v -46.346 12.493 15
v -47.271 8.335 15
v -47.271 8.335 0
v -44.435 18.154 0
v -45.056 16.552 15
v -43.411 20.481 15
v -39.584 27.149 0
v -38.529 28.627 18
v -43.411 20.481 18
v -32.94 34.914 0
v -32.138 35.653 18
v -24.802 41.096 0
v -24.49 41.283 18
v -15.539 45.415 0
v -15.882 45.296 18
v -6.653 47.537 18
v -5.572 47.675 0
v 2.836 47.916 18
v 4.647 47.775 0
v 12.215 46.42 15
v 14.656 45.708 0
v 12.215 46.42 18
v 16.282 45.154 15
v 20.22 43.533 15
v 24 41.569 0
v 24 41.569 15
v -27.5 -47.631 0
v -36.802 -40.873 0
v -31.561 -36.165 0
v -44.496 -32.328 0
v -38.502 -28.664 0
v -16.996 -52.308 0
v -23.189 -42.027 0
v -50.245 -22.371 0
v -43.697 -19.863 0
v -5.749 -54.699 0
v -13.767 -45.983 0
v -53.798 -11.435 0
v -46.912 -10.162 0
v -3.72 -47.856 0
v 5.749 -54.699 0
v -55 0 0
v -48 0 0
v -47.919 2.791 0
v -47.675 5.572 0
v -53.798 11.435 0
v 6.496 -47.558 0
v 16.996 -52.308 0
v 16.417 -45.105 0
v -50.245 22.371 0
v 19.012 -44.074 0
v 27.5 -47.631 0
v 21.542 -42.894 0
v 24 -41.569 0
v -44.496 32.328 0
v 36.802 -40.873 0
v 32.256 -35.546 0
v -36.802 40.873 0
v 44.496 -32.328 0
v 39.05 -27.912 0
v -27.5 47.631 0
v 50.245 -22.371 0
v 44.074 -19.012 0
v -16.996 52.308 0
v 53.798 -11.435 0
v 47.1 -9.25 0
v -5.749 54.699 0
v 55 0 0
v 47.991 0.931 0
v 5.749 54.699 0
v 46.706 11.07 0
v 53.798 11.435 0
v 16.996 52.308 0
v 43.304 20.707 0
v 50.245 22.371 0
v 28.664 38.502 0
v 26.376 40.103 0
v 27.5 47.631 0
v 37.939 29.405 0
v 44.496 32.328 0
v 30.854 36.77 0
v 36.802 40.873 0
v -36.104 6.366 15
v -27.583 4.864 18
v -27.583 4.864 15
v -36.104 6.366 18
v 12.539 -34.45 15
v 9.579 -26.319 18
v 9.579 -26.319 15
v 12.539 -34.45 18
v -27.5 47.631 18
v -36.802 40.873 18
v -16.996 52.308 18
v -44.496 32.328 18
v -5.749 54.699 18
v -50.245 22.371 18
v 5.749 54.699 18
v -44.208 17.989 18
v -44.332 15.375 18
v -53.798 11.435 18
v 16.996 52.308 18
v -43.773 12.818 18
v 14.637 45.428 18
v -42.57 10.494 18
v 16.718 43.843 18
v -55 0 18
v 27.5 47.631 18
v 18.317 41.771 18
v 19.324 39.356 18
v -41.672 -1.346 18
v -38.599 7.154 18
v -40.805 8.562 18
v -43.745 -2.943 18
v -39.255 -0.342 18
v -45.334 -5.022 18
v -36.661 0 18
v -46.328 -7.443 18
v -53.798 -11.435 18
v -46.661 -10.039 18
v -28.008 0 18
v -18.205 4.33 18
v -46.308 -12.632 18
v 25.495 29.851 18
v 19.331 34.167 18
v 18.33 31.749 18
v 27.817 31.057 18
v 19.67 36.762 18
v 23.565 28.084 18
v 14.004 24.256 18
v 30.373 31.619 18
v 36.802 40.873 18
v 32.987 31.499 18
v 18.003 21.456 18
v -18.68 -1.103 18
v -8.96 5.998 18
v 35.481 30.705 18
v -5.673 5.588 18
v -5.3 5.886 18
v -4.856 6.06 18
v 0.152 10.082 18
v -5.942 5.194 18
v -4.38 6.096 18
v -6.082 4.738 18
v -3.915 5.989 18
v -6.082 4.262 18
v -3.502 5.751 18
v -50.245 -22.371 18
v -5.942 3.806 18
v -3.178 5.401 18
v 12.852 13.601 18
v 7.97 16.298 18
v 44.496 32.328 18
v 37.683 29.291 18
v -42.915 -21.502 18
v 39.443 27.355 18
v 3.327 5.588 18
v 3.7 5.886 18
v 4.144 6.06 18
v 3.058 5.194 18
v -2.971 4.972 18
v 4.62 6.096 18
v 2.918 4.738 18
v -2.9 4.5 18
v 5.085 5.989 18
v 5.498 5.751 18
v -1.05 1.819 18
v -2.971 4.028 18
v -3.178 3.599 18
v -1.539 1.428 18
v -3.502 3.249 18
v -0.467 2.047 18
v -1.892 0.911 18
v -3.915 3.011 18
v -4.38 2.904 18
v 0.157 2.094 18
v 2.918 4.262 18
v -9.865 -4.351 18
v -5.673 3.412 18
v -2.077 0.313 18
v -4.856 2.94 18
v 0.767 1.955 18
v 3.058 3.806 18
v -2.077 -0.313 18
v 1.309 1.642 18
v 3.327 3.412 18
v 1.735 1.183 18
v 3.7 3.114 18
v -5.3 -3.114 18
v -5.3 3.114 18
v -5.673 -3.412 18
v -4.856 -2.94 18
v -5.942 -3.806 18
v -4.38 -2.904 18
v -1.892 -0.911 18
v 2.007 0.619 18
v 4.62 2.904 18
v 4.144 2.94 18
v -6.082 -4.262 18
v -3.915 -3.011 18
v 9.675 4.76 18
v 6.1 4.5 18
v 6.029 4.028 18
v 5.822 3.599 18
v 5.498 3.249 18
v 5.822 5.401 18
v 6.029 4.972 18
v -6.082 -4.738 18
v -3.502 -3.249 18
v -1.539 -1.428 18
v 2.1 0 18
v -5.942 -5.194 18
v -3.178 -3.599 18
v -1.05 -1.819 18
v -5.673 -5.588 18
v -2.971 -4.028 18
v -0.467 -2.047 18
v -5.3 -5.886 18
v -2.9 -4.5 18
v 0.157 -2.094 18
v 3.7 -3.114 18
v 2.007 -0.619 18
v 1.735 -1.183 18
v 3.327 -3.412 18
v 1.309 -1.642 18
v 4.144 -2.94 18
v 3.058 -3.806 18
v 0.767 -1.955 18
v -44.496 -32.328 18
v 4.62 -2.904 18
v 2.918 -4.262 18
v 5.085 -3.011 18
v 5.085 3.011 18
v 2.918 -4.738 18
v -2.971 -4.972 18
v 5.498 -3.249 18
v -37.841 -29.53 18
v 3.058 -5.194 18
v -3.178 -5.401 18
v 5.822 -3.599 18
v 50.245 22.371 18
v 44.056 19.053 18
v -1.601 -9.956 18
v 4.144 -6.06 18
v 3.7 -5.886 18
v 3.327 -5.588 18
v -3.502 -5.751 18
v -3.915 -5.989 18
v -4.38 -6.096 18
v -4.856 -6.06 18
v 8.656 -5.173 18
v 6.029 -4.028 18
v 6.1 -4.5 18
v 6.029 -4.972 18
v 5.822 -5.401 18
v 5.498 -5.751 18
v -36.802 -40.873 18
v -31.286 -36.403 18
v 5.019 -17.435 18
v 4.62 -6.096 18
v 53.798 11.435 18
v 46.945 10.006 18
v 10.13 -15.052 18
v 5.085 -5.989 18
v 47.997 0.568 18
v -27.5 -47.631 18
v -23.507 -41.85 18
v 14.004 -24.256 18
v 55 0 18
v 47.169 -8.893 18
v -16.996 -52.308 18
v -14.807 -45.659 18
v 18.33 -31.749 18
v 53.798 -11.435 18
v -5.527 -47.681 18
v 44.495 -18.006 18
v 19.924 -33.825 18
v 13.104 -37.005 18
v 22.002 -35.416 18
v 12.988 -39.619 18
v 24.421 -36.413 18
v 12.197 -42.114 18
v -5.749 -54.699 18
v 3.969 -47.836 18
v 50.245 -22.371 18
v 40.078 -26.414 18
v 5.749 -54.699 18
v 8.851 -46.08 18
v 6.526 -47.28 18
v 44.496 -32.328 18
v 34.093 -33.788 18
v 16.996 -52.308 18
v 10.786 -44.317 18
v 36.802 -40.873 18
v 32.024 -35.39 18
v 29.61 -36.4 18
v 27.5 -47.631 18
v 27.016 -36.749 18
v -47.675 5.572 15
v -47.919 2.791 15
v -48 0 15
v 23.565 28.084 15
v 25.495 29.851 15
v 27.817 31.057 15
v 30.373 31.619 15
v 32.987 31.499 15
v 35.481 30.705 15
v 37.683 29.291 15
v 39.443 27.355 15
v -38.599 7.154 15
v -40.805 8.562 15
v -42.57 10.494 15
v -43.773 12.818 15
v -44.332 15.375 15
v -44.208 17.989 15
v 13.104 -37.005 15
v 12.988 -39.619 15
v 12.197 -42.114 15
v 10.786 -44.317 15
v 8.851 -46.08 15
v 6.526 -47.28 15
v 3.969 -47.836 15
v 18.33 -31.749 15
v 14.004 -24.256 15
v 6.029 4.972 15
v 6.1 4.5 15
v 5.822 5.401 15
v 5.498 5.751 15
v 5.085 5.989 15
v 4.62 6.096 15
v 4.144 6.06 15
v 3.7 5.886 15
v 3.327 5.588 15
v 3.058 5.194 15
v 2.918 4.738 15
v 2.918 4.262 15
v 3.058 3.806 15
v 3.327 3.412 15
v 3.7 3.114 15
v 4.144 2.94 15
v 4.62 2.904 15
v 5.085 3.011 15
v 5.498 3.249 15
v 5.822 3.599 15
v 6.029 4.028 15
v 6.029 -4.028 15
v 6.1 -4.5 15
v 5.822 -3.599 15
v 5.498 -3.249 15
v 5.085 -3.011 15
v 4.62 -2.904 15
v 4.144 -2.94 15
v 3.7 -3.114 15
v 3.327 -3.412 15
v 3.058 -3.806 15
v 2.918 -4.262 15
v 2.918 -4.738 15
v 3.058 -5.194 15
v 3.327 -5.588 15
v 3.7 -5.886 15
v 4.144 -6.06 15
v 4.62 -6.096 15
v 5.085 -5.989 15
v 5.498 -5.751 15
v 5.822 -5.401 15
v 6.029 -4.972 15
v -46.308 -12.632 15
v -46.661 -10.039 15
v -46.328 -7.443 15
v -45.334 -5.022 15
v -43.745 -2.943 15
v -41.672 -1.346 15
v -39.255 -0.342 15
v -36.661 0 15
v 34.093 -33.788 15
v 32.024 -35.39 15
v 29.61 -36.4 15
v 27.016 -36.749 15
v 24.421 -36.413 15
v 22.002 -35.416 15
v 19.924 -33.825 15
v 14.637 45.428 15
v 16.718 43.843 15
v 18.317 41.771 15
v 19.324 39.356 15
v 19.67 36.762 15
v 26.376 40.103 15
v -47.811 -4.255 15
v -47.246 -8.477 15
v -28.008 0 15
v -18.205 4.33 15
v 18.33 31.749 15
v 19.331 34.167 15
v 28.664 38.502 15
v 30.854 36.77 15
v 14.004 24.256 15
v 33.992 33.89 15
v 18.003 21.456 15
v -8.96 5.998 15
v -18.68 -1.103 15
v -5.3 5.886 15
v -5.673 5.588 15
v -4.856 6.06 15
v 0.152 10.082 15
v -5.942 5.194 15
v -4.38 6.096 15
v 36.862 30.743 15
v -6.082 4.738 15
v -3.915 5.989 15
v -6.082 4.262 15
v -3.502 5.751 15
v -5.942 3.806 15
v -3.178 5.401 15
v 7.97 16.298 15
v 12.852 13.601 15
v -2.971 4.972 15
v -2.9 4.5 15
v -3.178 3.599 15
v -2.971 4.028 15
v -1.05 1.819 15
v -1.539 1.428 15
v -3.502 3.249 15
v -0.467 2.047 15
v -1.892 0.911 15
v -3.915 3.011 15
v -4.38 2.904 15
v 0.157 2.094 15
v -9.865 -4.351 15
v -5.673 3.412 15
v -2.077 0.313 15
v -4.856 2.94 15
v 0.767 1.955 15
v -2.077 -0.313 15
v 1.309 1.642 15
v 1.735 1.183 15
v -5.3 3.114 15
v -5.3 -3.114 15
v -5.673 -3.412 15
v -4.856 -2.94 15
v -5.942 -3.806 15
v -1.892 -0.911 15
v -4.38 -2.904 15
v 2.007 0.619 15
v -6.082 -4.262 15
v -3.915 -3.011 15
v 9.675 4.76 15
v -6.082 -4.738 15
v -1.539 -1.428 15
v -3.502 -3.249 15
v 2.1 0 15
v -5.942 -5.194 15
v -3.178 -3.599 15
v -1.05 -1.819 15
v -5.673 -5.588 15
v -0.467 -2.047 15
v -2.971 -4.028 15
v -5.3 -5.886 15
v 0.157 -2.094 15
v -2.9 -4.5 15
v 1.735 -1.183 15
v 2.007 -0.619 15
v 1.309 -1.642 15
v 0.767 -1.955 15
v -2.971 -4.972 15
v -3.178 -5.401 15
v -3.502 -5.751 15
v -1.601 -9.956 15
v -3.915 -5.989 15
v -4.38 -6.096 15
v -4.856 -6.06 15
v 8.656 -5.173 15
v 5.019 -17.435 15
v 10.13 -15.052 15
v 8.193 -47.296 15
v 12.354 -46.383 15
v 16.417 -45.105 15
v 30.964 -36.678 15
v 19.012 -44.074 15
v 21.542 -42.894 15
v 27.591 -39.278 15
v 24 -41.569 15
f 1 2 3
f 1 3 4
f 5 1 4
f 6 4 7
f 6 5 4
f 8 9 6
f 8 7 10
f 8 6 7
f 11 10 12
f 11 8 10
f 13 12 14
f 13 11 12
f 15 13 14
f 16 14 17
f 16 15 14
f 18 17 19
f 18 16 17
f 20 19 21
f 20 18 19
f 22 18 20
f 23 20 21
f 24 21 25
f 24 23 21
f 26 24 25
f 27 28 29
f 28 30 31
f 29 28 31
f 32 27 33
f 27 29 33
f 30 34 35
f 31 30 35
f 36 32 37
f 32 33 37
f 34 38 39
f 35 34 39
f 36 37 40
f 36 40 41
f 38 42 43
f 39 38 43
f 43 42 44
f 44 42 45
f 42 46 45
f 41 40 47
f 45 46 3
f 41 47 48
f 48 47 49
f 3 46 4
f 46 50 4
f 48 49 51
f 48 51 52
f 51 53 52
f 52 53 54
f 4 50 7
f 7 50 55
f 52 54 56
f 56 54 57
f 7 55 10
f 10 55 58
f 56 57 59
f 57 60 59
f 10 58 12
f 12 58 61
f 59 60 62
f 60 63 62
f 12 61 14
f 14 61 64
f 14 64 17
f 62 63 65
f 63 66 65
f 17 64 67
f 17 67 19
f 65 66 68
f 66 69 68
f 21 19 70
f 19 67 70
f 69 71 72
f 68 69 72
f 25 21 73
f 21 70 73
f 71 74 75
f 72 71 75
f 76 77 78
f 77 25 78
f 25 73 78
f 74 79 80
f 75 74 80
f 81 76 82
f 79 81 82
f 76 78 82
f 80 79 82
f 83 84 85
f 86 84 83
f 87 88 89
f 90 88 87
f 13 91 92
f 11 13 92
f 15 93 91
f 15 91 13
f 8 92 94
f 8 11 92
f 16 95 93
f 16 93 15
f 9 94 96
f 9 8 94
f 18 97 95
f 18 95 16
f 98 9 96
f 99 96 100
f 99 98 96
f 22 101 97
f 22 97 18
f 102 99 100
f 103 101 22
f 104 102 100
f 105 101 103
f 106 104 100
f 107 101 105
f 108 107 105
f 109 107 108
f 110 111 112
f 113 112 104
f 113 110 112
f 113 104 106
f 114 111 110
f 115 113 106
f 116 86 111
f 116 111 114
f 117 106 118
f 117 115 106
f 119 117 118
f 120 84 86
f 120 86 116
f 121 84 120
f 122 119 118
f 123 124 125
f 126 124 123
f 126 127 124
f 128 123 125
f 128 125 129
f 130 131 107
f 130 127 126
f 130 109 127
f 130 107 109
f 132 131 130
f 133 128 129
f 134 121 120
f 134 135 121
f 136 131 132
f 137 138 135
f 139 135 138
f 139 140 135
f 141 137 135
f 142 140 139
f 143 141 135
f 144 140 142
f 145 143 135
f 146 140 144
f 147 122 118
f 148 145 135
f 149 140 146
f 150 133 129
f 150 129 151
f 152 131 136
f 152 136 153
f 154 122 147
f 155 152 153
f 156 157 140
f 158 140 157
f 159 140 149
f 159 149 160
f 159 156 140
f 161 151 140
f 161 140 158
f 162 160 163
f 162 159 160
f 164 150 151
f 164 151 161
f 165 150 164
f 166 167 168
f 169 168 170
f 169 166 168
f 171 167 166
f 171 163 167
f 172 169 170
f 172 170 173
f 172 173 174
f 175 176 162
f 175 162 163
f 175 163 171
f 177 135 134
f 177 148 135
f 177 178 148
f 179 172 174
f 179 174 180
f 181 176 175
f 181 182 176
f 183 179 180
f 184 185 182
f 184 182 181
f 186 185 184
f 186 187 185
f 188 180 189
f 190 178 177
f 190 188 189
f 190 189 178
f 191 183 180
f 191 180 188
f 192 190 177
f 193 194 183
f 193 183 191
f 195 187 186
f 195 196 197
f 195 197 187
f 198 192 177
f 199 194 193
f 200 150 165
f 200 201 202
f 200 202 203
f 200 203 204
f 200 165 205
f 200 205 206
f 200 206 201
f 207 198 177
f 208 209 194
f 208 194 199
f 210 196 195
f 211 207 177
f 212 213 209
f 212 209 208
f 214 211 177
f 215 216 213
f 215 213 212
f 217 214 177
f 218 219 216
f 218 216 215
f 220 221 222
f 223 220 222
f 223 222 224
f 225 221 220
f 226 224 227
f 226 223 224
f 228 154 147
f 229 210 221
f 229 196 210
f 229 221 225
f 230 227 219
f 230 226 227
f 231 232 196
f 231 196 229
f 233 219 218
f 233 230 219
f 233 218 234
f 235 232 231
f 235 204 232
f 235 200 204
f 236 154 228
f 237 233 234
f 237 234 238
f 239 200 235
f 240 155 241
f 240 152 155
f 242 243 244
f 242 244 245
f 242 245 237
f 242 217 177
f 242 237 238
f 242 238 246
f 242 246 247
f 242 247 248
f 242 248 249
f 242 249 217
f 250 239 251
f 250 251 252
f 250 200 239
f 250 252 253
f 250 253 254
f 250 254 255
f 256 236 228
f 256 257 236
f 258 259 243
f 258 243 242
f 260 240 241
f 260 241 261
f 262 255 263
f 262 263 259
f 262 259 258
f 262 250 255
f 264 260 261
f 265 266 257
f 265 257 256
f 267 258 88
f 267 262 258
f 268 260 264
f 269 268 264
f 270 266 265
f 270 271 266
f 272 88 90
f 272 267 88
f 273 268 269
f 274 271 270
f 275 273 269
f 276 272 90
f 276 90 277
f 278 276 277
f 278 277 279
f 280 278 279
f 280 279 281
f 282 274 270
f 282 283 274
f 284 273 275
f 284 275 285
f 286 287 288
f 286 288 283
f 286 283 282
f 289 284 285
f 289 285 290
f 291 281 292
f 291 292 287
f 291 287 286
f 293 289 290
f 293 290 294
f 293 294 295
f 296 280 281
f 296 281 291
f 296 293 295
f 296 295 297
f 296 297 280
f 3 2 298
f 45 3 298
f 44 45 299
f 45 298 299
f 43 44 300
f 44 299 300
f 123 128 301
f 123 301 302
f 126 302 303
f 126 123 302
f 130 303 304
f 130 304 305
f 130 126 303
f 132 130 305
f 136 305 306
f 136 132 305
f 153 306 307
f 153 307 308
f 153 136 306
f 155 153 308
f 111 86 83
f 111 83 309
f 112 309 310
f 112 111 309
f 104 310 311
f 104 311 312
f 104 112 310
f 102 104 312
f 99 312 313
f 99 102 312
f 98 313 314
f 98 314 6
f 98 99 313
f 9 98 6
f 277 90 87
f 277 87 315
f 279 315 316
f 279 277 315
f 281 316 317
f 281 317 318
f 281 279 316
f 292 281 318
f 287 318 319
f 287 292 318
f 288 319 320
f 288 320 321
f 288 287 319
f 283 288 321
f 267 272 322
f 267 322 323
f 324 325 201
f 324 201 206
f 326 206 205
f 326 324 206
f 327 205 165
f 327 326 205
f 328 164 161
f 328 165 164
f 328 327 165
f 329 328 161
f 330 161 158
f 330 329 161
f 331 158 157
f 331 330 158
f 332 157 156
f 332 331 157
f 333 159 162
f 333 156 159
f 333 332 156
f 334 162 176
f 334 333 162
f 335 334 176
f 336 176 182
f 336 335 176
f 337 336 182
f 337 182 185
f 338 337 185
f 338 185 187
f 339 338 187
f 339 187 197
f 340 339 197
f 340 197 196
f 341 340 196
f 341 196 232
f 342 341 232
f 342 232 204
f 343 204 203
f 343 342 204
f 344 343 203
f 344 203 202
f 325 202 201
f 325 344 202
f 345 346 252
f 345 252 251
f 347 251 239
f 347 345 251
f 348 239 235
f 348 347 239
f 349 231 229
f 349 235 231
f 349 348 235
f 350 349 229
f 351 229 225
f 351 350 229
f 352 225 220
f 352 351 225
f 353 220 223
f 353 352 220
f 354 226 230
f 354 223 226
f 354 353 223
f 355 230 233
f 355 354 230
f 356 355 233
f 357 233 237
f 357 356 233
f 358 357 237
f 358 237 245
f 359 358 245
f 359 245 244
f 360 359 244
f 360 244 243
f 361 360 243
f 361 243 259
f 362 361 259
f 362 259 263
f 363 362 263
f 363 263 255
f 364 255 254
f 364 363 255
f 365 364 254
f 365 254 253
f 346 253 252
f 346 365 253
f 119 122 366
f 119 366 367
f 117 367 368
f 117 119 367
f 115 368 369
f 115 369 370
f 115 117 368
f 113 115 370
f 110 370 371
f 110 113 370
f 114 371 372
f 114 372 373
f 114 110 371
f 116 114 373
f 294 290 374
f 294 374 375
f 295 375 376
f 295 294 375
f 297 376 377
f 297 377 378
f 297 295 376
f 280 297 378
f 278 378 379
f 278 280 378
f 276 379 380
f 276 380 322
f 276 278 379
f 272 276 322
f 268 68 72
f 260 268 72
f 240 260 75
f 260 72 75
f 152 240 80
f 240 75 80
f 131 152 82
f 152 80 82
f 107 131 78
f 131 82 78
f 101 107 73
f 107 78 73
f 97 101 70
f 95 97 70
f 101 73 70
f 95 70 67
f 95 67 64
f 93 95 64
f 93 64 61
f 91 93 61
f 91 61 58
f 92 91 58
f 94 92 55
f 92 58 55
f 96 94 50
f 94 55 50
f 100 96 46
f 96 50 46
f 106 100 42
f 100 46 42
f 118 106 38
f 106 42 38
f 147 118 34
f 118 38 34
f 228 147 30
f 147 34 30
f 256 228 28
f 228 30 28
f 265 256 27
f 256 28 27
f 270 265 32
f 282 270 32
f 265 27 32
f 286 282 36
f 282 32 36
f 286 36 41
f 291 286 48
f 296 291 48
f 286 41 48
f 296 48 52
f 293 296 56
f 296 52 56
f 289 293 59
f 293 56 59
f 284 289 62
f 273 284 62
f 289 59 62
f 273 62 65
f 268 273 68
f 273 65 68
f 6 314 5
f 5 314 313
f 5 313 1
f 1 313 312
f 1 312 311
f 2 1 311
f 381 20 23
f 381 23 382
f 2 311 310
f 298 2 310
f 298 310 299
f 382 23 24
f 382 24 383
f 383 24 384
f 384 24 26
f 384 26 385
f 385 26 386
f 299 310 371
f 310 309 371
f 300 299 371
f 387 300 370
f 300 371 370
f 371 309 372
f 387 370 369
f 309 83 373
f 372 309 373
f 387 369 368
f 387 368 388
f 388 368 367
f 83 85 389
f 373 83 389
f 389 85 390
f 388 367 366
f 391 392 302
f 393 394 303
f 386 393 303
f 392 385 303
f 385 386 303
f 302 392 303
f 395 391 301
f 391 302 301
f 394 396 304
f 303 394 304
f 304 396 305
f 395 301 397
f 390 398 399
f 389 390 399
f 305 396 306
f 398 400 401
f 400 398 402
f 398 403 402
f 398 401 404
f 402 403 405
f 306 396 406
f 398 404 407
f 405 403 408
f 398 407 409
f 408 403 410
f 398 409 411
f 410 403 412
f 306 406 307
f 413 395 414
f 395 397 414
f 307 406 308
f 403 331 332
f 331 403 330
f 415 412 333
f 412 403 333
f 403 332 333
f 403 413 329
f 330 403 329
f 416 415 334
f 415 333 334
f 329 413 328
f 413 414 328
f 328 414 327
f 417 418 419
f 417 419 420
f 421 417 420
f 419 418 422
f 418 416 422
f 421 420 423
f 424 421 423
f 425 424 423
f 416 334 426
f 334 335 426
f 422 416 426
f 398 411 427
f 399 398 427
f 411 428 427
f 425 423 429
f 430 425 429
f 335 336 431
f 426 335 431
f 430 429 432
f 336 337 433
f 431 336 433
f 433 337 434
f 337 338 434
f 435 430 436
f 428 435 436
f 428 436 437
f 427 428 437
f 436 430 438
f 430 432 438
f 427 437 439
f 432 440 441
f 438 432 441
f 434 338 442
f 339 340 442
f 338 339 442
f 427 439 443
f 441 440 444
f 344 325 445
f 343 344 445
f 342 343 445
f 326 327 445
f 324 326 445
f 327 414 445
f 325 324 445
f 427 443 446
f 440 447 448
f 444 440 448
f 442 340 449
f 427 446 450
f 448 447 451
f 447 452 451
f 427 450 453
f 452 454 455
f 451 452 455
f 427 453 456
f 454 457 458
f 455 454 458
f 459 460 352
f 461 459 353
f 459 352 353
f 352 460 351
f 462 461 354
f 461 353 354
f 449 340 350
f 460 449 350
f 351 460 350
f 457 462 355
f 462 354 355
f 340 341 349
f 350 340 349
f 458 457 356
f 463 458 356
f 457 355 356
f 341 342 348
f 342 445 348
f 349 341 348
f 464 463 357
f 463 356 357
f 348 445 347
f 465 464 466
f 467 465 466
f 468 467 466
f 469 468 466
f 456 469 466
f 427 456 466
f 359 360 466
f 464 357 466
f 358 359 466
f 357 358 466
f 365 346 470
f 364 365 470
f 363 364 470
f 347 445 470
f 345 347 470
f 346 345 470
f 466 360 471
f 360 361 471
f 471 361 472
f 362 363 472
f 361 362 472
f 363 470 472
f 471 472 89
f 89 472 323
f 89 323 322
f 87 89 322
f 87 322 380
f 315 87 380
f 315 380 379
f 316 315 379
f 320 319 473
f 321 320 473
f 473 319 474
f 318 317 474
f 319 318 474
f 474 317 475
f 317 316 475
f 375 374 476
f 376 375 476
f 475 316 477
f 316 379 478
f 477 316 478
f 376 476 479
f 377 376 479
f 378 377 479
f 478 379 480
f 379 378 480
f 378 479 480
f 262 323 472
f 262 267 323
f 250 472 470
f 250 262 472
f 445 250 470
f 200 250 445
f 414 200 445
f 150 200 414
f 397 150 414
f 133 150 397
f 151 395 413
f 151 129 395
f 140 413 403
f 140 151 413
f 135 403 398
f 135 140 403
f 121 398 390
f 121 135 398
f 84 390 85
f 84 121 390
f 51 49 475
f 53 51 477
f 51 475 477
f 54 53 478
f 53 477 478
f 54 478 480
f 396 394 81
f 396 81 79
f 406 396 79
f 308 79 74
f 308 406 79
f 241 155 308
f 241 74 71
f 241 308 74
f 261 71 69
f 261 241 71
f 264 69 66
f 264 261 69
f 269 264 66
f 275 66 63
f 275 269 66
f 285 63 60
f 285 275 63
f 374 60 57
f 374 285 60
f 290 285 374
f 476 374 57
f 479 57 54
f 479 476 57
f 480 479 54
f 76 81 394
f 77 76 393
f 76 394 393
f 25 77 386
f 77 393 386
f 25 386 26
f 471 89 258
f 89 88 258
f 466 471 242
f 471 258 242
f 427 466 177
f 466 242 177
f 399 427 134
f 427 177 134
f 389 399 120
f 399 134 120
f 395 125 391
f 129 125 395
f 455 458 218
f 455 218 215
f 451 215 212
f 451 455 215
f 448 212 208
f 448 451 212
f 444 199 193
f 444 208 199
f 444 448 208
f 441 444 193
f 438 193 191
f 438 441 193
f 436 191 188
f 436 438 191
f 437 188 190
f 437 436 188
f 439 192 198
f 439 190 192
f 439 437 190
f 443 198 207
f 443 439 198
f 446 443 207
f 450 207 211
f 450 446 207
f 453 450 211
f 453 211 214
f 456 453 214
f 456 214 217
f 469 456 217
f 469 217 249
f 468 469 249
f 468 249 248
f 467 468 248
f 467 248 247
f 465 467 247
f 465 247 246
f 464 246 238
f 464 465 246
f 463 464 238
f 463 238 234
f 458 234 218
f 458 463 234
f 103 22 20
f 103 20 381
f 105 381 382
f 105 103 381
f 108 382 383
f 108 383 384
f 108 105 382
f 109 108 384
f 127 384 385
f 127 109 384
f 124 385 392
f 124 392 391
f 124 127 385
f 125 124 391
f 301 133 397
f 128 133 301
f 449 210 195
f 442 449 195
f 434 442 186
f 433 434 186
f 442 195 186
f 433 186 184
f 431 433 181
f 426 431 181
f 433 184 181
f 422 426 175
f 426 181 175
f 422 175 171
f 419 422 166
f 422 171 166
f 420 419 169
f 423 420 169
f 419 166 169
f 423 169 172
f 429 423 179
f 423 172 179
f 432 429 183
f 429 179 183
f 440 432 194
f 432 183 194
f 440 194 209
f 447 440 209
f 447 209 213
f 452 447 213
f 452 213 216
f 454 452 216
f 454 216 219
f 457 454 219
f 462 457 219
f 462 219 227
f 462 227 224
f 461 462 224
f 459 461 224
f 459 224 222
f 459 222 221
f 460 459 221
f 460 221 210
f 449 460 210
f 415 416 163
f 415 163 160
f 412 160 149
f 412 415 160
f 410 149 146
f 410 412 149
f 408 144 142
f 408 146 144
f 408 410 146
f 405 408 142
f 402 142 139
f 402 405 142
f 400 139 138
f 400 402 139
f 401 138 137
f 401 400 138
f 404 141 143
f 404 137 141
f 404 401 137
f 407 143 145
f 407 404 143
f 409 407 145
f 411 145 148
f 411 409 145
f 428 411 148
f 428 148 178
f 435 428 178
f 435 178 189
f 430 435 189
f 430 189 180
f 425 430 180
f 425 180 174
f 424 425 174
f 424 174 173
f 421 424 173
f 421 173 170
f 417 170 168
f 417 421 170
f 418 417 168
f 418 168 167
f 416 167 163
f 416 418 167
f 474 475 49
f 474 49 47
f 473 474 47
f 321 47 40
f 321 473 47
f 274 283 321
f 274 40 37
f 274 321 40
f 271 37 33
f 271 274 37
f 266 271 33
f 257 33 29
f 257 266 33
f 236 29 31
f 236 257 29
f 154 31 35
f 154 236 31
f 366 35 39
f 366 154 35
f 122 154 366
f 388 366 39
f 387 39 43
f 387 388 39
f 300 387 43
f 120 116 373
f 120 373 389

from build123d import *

# Parameters (mm, degrees)
ESQUISSE1_R             = 55
BOSS_EXTRU_1_DEPTH      = 18
ESQUISSE2_R             = 2.1
ENL_V_MAT_EXTRU_1_DEPTH = 80.837334625
ENL_V_MAT_EXTRU_2_DEPTH = 80.837334625
ENL_V_MAT_EXTRU_3_DEPTH = 80.837334625
ENL_V_START             = 15
ESQUISSE8_R             = 48
ENL_V_MAT_EXTRU_4_DEPTH = 15
CONG_3_R                = 10
CONG_4_R                = 10
CONG_5_R                = 60
CONG_7_R                = 40
ESQUISSE10_R            = 1.6
ENL_V_MAT_EXTRU_9_DEPTH = 80.837334785


with BuildPart() as part:
    # Esquisse1 → Boss.-Extru.1 (new body)
    with BuildSketch(Plane.XY):
        Circle(ESQUISSE1_R)
    extrude(amount=BOSS_EXTRU_1_DEPTH)

    # Esquisse2 → Enlèv. mat.-Extru.1 (cut, through all)
    with BuildSketch(Plane.XY.offset(18)):
        Circle(ESQUISSE2_R)
    extrude(amount=-ENL_V_MAT_EXTRU_1_DEPTH, mode=Mode.SUBTRACT)

    # Esquisse3 → Enlèv. mat.-Extru.2 (cut, through all)
    with BuildSketch(Plane.XY.offset(18)):
        with BuildLine():
            ThreePointArc((-7.5, 0), (-4.301823273, -6.143640332), (2.565151075, -7.047694656))
            Line((2.565151075, -7.047694656), (16.41696688, -45.105245798))
            ThreePointArc((16.41696688, -45.105245798), (-27.531668945, -39.319298126), (-48, 0))
            Line((-48, 0), (-7.5, 0))
        make_face()
        with BuildLine():
            ThreePointArc((-47.270772145, 8.335112528), (-20.285676564, 43.502773778), (24, 41.569219382))
            Line((24, 41.569219382), (3.75, 6.495190528))
            ThreePointArc((3.75, 6.495190528), (-3.169636963, 6.797308403), (-7.386058148, 1.302361333))
            Line((-7.386058148, 1.302361333), (-47.270772145, 8.335112528))
        make_face()
        with BuildLine():
            ThreePointArc((30.853805265, 36.77013327), (47.817345508, -4.183475652), (24, -41.569219382))
            Line((24, -41.569219382), (3.75, -6.495190528))
            ThreePointArc((3.75, -6.495190528), (7.471460236, -0.653668071), (4.820907073, 5.745333323))
            Line((4.820907073, 5.745333323), (30.853805265, 36.77013327))
        make_face()
    extrude(amount=-ENL_V_MAT_EXTRU_2_DEPTH, mode=Mode.SUBTRACT)

    # Esquisse7 → Enlèv. mat.-Extru.3 (cut, through all)
    with BuildSketch(Plane.XY):
        with BuildLine():
            Line((2.565151075, -7.047694656), (-27.531668945, -39.319298126))
            Line((-27.531668945, -39.319298126), (-7.5, 0))
            ThreePointArc((-7.5, 0), (-3.331557771, -4.75795759), (2.565151075, -7.047694656))
        make_face()
        with BuildLine():
            Line((4.820907073, 5.745333323), (47.817345508, -4.183475652))
            Line((47.817345508, -4.183475652), (3.75, -6.495190528))
            ThreePointArc((3.75, -6.495190528), (5.786291029, -0.506234869), (4.820907073, 5.745333323))
        make_face()
        with BuildLine():
            Line((3.75, 6.495190528), (-20.285676564, 43.502773778))
            Line((-20.285676564, 43.502773778), (-7.386058148, 1.302361333))
            ThreePointArc((-7.386058148, 1.302361333), (-2.454733258, 5.264192459), (3.75, 6.495190528))
        make_face()
    extrude(amount=ENL_V_MAT_EXTRU_3_DEPTH, mode=Mode.SUBTRACT)

    # Esquisse8 → Enlèv. mat.-Extru.4 (cut)
    with BuildSketch(Plane.XY.offset(ENL_V_START)):
        Circle(ESQUISSE8_R)
    extrude(amount=-ENL_V_MAT_EXTRU_4_DEPTH, mode=Mode.SUBTRACT)

    # Congé3
    # the kernel refuses this fillet: 10 mm, written as the material it adds along each edge
    with BuildSketch(Plane(origin=(-47.270772145, 8.335112528, 18), x_dir=(0.3028483404391726, 0.9530387624295452, 0), z_dir=(0, 0, -1))) as cong_3_piece_1:
        with BuildLine():
            CenterArc((11.416839641, 9.911490246), CONG_3_R, 172.371238355, 105.25752329)
            Line((1.505349395, 11.239029739), (0, 0))
            ThreePointArc((0, 0), (6.372189567, -0.42484682), (12.744379134, 0))
        make_face()
    extrude(amount=3)
    with BuildSketch(Plane(origin=(24, 41.569219382, 18), x_dir=(-0.9247372088845717, 0.38060621973947306, 0), z_dir=(0, 0, -1)), Plane(origin=(24, -41.569219382, 18), x_dir=(0.7919832595750325, 0.6105428048490187, 0), z_dir=(0, 0, -1)), Plane(origin=(-48, 0, 18), x_dir=(0.13275394930954024, -0.9911490245884924, 0), z_dir=(0, 0, -1))) as cong_3_piece_2:
        with BuildLine():
            CenterArc((11.416839641, -9.911490246), CONG_3_R, 82.371238355, 105.25752329)
            Line((1.505349395, -11.239029739), (0, 0))
            ThreePointArc((0, 0), (6.372189567, 0.42484682), (12.744379134, 0))
        make_face()
    extrude(amount=3)
    with BuildSketch(Plane(origin=(16.41696688, -45.105245798, 18), x_dir=(-0.34202014332566844, 0.9396926207859085, 0), z_dir=(0, 0, -1))) as cong_3_piece_3:
        with BuildLine():
            CenterArc((11.33939444, -10), CONG_3_R, 90, 105.25752329)
            ThreePointArc((1.691866661, -12.631578947), (0.42484682, -6.372189567), (0, 0))
            Line((0, 0), (11.33939444, 0))
        make_face()
    extrude(amount=3)

    # Congé4
    # the kernel refuses this fillet: 10 mm, written as the material it adds along each edge
    with BuildSketch(Plane(origin=(30.853805265, 36.77013327, 18), x_dir=(0.6739316088356829, -0.7387937375290534, 0), z_dir=(0, 0, -1))) as cong_4_piece_1:
        with BuildLine():
            CenterArc((11.416839641, 9.911490246), CONG_4_R, 172.371238355, 105.25752329)
            Line((1.505349395, 11.239029739), (0, 0))
            ThreePointArc((0, 0), (6.372189567, -0.42484682), (12.744379134, 0))
        make_face()
    extrude(amount=3)

    # Congé5
    # the kernel refuses this fillet: 60 mm, written as the material it adds along each edge
    with BuildSketch(Plane(origin=(-7.386058148, 1.302361333, 18), x_dir=(0.8285733508252506, 0.5598805250249523, 0), z_dir=(0, 0, -1)), Plane(origin=(2.565151075, -7.047694656, 18), x_dir=(-0.8991574331684032, 0.4376253082009868, 0), z_dir=(0, 0, -1))) as cong_5_piece_1:
        with BuildLine():
            CenterArc((27.479152806, -56.896321194), CONG_5_R, 108.509321534, 25.538214121)
            Line((-14.236143248, -13.770527577), (0, 0))
            ThreePointArc((0, 0), (4.215808312, -0.686940021), (8.431616624, 0))
        make_face()
    extrude(amount=3)
    with BuildSketch(Plane(origin=(3.75, 6.495190528, 18), x_dir=(0.4999999999999999, 0.8660254037844387, 0), z_dir=(0, 0, -1)), Plane(origin=(-7.5, 0, 18), x_dir=(-1, 0, 0), z_dir=(0, 0, -1))) as cong_5_piece_2:
        with BuildLine():
            CenterArc((19.806443505, -60), CONG_5_R, 90, 25.538214121)
            ThreePointArc((-6.060335973, -5.862123061), (-2.552569547, -3.424808757), (0, 0))
            Line((0, 0), (19.806443505, 0))
        make_face()
    extrude(amount=3)
    with BuildSketch(Plane(origin=(4.820907073, 5.745333323, 18), x_dir=(0.6427876096865399, 0.7660444431189776, 0), z_dir=(0, 0, -1))) as cong_5_piece_3:
        with BuildLine():
            CenterArc((19.806443505, 60), CONG_5_R, 244.461785879, 25.538214121)
            ThreePointArc((-6.060335973, 5.862123061), (-2.552569547, 3.424808757), (0, 0))
            Line((0, 0), (19.806443505, 0))
        make_face()
    extrude(amount=3)
    with BuildSketch(Plane(origin=(3.75, -6.495190528, 18), x_dir=(0.24272682168261056, 0.9700946809646254, 0), z_dir=(0, 0, -1))) as cong_5_piece_4:
        with BuildLine():
            CenterArc((27.479152806, 56.896321194), CONG_5_R, 225.952464345, 25.538214121)
            Line((-14.236143248, 13.770527577), (0, 0))
            ThreePointArc((0, 0), (4.215808312, 0.686940021), (8.431616624, 0))
        make_face()
    extrude(amount=3)

    # Congé7
    cong_7_edges = [part.edges().sort_by_distance(p)[0] for p in [
        (-2.549741992, 5.467939348, 16.5),
        (6.010245378, -0.525828336, 16.5),
        (-3.460503385, -4.942111012, 16.5),
    ]]
    fillet(cong_7_edges, radius=CONG_7_R)

    # Esquisse10 → Enlèv. mat.-Extru.9 (cut, through all)
    with BuildSketch(Plane.XY):
        with Locations((-4.5, -4.5)):
            Circle(ESQUISSE10_R)
        with Locations((-4.5, 4.5)):
            Circle(ESQUISSE10_R)
        with Locations((4.5, 4.5)):
            Circle(ESQUISSE10_R)
        with Locations((4.5, -4.5)):
            Circle(ESQUISSE10_R)
    extrude(amount=ENL_V_MAT_EXTRU_9_DEPTH, mode=Mode.SUBTRACT)


solid = part.part
